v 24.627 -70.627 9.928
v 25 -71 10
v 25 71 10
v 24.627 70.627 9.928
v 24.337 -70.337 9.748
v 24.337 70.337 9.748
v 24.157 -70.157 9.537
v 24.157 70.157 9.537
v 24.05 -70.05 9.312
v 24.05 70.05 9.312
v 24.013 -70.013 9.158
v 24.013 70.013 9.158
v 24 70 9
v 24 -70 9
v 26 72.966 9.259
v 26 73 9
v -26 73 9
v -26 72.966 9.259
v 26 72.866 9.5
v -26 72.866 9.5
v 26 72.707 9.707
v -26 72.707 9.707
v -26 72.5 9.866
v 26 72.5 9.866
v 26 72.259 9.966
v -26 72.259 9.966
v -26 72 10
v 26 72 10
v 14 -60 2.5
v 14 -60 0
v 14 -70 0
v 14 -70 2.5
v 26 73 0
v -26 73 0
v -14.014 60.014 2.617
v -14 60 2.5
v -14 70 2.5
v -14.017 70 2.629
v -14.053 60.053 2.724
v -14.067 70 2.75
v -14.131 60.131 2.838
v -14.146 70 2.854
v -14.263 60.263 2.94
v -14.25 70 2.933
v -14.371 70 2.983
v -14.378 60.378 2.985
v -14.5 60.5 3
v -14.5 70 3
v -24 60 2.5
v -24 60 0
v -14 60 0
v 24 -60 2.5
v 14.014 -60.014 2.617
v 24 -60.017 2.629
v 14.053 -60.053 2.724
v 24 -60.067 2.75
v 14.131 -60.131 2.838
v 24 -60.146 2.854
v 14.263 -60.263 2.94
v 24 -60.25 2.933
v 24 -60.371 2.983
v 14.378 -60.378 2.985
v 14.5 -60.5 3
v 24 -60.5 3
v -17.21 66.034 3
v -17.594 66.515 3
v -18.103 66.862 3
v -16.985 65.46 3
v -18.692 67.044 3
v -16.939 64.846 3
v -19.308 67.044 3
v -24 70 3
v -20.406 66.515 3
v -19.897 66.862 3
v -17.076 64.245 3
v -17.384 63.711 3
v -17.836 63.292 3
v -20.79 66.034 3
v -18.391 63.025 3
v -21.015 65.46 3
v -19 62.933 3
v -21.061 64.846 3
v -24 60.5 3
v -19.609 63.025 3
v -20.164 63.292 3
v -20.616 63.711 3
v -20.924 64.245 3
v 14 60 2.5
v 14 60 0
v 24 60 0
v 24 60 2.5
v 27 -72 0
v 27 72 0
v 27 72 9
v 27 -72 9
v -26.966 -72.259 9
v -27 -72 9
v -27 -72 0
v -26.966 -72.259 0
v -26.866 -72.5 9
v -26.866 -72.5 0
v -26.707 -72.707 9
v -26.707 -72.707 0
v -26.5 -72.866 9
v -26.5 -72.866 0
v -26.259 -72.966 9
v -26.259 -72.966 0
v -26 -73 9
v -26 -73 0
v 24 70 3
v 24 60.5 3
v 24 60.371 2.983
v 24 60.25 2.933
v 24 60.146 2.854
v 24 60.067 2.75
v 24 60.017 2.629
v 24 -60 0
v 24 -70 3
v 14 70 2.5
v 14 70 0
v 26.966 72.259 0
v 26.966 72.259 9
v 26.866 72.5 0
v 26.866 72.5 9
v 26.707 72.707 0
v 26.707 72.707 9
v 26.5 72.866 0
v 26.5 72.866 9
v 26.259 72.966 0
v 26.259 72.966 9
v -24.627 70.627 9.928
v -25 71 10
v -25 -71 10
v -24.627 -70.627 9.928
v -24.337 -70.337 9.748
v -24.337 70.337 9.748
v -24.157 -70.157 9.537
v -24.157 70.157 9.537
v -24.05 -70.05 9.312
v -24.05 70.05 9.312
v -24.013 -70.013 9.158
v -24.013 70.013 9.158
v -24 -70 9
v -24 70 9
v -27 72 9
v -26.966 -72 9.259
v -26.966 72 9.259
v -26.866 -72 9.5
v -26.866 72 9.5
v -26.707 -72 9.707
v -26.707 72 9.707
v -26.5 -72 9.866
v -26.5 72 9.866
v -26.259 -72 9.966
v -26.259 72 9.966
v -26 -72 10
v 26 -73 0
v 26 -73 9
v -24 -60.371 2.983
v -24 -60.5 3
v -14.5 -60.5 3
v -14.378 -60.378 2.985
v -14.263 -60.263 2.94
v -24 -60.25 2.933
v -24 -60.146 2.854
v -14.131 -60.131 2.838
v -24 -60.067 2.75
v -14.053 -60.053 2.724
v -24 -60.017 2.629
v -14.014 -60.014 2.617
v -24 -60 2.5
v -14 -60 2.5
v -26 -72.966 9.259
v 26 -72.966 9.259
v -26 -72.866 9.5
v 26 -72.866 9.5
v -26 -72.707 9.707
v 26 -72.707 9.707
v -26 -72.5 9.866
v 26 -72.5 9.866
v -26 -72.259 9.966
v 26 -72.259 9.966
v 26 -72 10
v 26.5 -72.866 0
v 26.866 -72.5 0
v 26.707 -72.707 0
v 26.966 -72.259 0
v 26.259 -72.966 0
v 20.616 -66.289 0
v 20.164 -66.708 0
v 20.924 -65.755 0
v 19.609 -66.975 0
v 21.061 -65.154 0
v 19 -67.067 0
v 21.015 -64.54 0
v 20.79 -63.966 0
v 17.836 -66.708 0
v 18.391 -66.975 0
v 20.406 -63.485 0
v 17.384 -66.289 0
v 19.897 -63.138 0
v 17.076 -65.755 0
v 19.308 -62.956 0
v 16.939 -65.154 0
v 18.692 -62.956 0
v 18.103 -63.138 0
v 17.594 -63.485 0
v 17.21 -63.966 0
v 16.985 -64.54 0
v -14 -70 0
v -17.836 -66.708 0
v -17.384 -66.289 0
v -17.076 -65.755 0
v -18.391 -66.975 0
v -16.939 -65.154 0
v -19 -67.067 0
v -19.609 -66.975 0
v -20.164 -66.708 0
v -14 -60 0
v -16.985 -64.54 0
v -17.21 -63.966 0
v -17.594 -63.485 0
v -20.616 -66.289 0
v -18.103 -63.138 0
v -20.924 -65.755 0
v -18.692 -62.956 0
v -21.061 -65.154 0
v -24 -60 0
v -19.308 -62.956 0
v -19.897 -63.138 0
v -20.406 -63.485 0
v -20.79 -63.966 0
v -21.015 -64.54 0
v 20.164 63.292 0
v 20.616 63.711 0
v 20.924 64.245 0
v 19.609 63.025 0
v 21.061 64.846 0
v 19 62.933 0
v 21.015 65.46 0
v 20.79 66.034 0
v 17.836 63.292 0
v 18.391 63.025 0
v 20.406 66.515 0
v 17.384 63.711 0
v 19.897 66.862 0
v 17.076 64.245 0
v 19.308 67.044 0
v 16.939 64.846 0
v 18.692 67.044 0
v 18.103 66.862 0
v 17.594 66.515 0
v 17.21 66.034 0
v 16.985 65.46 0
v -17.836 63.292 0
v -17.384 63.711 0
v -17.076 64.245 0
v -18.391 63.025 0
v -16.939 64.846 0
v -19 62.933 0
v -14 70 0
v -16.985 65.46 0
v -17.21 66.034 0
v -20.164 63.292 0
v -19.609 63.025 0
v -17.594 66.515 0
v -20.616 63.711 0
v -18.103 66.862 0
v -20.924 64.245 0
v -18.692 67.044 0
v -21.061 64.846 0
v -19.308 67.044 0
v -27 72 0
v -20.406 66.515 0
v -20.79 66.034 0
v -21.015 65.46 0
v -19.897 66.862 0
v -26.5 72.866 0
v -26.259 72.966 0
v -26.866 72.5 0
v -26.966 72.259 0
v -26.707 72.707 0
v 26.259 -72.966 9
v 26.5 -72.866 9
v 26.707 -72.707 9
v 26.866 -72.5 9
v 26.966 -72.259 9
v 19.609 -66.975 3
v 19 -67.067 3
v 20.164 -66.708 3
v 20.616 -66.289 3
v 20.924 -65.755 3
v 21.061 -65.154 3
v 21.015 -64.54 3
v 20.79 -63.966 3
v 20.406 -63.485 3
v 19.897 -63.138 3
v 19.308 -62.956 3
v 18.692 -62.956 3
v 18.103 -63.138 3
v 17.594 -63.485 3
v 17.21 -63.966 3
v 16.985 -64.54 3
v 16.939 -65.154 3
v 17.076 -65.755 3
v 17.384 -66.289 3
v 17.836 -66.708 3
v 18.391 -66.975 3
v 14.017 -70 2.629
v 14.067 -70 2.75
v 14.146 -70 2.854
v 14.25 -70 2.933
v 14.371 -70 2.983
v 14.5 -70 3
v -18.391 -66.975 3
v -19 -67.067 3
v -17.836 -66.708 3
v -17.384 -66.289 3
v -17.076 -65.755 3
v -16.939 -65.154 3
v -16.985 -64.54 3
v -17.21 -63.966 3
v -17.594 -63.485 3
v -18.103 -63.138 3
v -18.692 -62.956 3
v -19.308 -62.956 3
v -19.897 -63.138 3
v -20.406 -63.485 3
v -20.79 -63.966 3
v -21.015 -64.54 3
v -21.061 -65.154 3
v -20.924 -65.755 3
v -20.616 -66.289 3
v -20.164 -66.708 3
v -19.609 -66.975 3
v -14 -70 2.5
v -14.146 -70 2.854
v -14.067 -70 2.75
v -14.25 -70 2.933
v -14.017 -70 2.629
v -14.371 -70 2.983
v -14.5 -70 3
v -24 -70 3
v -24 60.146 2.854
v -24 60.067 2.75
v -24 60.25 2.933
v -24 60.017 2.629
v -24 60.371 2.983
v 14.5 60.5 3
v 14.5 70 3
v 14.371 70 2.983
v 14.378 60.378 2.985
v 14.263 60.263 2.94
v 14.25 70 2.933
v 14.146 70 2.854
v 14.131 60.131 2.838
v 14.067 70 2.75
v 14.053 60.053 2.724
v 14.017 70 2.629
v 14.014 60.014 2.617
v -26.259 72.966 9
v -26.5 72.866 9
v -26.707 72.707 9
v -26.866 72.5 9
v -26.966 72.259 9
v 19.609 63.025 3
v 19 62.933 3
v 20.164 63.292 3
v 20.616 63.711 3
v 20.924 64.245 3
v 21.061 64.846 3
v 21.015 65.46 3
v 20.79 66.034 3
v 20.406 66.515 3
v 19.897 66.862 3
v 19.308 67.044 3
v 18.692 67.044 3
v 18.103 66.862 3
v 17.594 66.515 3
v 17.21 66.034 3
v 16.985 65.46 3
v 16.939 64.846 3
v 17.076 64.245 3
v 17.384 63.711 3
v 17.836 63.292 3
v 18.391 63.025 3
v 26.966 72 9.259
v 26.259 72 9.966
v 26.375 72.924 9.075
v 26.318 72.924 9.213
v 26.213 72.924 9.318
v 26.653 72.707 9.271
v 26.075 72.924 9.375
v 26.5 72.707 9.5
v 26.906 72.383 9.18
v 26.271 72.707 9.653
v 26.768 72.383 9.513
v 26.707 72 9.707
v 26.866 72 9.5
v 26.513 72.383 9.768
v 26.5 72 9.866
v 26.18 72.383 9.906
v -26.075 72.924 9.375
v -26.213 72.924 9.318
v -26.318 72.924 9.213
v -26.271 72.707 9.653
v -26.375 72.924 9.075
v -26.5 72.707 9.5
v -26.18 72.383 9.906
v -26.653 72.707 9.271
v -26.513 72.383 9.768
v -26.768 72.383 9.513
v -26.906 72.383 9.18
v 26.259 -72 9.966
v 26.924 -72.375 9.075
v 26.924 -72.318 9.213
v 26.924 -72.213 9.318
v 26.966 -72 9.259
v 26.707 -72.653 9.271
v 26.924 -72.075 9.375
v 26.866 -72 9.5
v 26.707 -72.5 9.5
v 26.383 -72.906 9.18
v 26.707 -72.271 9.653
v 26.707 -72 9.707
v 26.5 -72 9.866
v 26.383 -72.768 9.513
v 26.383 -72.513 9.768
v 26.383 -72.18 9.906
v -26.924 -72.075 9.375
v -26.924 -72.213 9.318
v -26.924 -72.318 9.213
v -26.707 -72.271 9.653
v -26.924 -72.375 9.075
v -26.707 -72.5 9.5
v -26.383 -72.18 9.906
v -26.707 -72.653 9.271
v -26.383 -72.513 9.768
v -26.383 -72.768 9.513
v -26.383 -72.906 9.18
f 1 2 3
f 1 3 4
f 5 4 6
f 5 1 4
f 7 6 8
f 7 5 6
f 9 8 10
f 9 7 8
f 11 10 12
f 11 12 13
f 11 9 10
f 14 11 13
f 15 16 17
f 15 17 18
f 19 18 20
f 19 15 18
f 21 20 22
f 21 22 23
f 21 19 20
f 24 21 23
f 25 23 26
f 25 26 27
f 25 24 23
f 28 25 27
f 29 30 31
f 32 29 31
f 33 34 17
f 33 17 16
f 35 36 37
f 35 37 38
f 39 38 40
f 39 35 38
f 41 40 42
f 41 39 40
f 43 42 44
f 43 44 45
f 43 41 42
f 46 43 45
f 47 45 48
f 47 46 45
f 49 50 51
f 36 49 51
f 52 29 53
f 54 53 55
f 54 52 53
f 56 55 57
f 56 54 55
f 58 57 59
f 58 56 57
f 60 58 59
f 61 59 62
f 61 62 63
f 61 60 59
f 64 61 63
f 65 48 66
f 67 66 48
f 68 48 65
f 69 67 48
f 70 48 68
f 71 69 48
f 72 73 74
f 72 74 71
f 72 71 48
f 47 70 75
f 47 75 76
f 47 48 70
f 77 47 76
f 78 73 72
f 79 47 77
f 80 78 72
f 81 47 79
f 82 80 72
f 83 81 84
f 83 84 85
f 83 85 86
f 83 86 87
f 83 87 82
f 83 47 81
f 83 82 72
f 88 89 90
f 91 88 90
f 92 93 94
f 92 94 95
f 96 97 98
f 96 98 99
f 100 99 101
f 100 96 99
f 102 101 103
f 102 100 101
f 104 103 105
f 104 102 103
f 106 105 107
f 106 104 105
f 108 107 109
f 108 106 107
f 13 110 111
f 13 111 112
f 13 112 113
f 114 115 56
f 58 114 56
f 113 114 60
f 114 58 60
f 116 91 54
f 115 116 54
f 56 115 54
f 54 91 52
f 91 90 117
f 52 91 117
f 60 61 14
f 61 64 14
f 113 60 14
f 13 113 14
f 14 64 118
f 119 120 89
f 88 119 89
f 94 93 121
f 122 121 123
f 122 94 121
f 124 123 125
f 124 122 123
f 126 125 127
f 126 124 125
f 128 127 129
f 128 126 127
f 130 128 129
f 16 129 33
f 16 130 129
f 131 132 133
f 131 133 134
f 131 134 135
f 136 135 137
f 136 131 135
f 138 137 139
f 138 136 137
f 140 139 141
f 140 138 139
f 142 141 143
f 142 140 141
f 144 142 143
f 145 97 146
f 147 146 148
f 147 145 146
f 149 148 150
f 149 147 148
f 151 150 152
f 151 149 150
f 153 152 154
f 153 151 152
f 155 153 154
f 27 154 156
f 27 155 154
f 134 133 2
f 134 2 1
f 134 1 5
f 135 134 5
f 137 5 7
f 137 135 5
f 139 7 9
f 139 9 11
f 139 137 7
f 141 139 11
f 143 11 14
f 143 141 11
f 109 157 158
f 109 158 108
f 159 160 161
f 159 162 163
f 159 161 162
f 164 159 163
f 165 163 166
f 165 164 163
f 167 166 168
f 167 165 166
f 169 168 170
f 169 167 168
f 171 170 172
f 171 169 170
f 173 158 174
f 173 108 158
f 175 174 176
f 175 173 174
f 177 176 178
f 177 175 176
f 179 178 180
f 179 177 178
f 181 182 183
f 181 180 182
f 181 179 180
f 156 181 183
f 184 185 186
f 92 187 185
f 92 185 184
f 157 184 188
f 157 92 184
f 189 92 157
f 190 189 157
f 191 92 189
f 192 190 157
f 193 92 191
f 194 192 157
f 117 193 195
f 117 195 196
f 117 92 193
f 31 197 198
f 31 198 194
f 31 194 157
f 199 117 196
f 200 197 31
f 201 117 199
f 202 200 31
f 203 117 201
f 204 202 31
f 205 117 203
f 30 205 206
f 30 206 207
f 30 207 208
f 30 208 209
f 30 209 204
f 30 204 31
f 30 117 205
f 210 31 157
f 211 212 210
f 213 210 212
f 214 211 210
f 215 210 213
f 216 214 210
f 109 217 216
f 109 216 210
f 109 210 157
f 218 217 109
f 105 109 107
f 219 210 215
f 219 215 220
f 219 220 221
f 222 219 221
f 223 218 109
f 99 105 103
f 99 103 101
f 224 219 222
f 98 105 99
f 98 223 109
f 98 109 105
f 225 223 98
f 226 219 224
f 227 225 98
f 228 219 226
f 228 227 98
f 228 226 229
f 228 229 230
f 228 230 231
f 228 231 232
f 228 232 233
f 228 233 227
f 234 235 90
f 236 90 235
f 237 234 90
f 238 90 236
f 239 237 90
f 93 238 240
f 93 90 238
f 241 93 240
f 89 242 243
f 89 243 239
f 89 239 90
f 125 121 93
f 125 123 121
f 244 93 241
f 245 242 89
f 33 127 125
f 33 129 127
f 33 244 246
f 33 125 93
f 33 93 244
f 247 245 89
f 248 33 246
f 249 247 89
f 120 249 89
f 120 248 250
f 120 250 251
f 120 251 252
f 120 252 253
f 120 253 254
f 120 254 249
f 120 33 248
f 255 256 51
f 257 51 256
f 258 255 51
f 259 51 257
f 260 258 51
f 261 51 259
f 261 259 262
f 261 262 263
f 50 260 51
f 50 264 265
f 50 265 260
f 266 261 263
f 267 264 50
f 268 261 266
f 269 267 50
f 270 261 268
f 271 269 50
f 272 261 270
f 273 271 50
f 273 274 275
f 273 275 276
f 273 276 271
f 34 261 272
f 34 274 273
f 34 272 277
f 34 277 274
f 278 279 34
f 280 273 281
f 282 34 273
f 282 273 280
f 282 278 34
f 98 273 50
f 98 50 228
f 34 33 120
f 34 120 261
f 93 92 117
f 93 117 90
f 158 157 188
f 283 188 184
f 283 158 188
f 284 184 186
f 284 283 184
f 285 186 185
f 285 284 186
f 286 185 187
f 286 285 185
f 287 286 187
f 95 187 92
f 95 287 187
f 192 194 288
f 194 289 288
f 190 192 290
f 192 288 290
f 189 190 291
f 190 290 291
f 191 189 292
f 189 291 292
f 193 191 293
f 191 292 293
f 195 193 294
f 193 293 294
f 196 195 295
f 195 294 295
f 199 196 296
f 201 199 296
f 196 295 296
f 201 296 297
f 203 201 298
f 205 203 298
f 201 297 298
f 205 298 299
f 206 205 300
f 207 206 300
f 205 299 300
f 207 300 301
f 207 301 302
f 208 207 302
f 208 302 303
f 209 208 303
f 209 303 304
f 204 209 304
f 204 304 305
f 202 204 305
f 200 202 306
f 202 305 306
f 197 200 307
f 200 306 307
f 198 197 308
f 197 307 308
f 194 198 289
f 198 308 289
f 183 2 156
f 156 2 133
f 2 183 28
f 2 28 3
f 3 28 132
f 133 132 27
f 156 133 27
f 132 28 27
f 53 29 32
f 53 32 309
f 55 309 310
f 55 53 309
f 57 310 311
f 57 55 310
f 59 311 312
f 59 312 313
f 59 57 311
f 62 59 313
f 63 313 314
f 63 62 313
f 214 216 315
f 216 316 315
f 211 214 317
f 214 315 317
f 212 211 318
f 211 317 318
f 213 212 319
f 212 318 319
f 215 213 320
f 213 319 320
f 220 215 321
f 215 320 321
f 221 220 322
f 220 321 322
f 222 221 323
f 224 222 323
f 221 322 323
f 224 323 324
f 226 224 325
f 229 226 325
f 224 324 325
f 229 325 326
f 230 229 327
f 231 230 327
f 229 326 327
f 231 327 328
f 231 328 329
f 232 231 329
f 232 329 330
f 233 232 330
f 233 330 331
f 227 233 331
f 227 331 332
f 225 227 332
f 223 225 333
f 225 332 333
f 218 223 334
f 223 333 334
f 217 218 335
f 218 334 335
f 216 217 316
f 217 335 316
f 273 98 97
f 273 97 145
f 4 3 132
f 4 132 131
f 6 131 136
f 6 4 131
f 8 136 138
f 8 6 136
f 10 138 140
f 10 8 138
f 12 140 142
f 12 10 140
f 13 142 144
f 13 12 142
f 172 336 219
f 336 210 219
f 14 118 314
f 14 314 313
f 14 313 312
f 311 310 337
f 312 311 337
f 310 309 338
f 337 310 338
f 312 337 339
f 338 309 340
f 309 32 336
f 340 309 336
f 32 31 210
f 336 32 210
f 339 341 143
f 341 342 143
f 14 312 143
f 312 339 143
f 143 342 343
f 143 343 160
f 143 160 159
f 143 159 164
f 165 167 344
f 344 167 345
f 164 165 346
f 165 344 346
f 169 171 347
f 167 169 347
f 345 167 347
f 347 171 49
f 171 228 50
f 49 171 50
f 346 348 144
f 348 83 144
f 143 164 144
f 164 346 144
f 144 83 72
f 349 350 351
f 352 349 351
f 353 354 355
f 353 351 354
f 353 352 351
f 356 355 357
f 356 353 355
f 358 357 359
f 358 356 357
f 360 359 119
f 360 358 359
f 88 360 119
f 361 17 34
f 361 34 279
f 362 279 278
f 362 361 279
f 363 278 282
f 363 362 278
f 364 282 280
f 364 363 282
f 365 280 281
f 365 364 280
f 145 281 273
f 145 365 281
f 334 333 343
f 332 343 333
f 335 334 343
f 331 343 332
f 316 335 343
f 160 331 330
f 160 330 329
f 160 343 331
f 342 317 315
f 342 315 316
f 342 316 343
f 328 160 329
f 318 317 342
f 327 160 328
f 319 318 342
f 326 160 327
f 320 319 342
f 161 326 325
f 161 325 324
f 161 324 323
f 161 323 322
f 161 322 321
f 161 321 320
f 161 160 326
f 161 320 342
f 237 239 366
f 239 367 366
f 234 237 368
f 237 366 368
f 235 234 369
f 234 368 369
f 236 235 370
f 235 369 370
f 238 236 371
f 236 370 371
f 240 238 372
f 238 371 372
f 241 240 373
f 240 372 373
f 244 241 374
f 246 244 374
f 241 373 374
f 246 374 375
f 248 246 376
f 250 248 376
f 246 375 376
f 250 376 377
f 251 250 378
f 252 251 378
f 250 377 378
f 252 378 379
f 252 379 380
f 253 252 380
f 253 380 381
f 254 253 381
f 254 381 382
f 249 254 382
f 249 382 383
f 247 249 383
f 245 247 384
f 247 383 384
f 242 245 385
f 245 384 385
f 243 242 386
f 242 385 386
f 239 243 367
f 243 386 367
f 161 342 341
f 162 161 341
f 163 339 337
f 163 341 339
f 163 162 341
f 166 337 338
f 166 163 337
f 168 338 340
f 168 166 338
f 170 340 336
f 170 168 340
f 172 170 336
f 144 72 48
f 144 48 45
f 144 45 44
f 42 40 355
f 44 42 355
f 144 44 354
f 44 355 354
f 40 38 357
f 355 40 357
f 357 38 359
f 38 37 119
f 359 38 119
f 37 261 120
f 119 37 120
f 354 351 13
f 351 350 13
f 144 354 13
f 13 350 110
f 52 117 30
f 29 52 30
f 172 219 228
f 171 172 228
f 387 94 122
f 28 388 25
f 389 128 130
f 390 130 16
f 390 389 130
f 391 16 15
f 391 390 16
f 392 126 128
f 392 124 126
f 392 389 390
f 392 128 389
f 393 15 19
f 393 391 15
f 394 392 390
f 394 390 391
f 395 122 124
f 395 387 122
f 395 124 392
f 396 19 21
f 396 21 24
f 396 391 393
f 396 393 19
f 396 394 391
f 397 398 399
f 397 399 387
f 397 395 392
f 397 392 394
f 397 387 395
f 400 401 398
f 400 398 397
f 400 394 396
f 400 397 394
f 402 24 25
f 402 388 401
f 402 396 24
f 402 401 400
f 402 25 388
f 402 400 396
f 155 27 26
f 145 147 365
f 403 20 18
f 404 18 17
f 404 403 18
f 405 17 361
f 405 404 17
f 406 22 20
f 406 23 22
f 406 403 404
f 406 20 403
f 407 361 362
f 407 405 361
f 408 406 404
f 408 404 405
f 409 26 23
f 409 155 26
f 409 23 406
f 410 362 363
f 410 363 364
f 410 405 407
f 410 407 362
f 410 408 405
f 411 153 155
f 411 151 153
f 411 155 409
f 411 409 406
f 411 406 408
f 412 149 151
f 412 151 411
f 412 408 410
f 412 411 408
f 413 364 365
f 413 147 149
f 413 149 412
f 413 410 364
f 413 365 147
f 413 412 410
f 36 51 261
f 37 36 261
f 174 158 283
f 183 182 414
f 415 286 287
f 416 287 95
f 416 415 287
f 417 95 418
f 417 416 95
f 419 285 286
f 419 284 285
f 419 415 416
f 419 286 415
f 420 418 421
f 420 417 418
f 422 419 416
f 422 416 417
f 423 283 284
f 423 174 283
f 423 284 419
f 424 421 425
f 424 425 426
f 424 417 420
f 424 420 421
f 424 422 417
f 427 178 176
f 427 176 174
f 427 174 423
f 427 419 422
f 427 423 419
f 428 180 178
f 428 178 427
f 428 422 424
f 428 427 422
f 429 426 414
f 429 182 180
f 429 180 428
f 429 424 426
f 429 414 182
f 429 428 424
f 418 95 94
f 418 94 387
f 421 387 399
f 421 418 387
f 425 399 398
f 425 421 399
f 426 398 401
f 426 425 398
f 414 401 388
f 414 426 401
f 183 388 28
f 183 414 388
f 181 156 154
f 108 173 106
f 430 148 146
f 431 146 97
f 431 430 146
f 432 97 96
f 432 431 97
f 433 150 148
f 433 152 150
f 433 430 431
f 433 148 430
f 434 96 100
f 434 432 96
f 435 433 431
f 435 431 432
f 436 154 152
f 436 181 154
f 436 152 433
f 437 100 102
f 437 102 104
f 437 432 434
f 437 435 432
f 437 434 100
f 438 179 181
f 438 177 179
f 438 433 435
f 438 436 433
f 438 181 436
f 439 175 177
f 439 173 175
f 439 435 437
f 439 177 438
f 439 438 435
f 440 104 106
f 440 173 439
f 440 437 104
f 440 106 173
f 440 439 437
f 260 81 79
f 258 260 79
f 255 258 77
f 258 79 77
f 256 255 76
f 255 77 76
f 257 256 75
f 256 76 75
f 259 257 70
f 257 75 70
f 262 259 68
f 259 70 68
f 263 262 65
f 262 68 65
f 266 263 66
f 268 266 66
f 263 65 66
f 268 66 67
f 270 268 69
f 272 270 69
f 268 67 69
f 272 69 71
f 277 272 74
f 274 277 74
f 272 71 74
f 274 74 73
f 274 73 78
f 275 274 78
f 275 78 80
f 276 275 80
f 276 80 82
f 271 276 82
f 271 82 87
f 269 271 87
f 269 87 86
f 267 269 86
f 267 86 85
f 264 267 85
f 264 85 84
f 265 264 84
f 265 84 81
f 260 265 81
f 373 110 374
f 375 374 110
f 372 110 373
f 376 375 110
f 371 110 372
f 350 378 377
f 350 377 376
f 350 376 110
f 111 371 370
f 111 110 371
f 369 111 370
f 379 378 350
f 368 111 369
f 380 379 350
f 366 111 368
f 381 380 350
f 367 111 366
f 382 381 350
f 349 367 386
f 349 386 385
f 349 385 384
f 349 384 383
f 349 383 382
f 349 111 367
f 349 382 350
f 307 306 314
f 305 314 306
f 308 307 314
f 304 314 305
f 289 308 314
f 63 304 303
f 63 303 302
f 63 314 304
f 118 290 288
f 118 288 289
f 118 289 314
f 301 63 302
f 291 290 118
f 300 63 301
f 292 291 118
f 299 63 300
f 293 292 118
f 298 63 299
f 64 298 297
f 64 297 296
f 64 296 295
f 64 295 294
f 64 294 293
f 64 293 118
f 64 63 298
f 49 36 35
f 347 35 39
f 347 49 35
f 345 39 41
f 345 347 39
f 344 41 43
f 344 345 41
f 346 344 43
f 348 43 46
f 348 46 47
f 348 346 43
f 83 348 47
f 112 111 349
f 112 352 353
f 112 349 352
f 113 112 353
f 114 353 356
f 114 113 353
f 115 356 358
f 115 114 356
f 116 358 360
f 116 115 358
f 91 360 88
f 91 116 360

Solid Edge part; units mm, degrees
sketch "Sketch1" plane through (0, 0, 0) normal (0, 0, 1) x (1, 0, 0)
  line L0 (27, -73) -> (-27, -73)
  line L1 (-27, -73) -> (-27, 73)
  line L2 (-27, 73) -> (27, 73)
  line L3 (27, 73) -> (27, -73)
  dimension "D1" = 146
  dimension "D2" = 54
extrude "Protrusion1" add sketch "Sketch1" along normal blind 10
sketch "Sketch2" plane through (0, 0, 10) normal (0, 0, 1) x (1, 0, 0)
  line L0 (24, -70) -> (-24, -70)
  line L1 (-24, -70) -> (-24, 70)
  line L2 (-24, 70) -> (24, 70)
  line L3 (24, 70) -> (24, -70)
  dimension "D1" = 140
  dimension "D2" = 48
  dimension "D3" = 3
  dimension "D4" = 3
extrude "Extrusionsausschnitt_1" cut sketch "Sketch2" along normal mid plane 76
fillet "Verrundung_1" radius 1 12 edges at (0, -73, 10) (-24, 0, 10) (-27, 0, 10) (0, -70, 10) (24, 0, 10) (27, 0, 10) (0, 73, 10) (0, 70, 10) (-27, 73, 5) (27, 73, 5) (27, -73, 5) (-27, -73, 5)
sketch "Sketch3" plane through (0, 0, 0) normal (0, 0, 1) x (1, 0, 0)
  line L0 (-14, -70) -> (-14, -60)
  line L1 (-14, -60) -> (-24, -60)
  line L2 (-24, -70) -> (-24, -60)
  line L3 (-14, -70) -> (-24, -70)
  dimension "D1" = 10
  dimension "D2" = 10
extrude "Extrusionsausprägung_2" add sketch "Sketch3" along normal blind 3
mirror "Mirror1" about plane through (0, 0, 0) normal (0, -1, 0) of "Extrusionsausprägung_2"
mirror "Mirror2" about plane through (0, 0, 0) normal (1, 0, 0) of "Mirror1", "Extrusionsausprägung_2"
hole "Bohrung_1" at (-19, -65, 3) direction (0, 0, -1) diameter 4.134 end through all
hole "Hole1" at (19, -65, 3) direction (0, 0, -1) diameter 4.134 end through all
hole "Hole2" at (19, 65, 3) direction (0, 0, -1) diameter 4.134 end through all
hole "Hole3" at (-19, 65, 3) direction (0, 0, -1) diameter 4.134 end through all
fillet "Verrundung_2" radius 0.5 8 edges at (-19, -60, 3) (-14, -65, 3) (14, -65, 3) (19, -60, 3) (-19, 60, 3) (-14, 65, 3) (14, 65, 3) (19, 60, 3)
properties part number "041" material "PLA"
